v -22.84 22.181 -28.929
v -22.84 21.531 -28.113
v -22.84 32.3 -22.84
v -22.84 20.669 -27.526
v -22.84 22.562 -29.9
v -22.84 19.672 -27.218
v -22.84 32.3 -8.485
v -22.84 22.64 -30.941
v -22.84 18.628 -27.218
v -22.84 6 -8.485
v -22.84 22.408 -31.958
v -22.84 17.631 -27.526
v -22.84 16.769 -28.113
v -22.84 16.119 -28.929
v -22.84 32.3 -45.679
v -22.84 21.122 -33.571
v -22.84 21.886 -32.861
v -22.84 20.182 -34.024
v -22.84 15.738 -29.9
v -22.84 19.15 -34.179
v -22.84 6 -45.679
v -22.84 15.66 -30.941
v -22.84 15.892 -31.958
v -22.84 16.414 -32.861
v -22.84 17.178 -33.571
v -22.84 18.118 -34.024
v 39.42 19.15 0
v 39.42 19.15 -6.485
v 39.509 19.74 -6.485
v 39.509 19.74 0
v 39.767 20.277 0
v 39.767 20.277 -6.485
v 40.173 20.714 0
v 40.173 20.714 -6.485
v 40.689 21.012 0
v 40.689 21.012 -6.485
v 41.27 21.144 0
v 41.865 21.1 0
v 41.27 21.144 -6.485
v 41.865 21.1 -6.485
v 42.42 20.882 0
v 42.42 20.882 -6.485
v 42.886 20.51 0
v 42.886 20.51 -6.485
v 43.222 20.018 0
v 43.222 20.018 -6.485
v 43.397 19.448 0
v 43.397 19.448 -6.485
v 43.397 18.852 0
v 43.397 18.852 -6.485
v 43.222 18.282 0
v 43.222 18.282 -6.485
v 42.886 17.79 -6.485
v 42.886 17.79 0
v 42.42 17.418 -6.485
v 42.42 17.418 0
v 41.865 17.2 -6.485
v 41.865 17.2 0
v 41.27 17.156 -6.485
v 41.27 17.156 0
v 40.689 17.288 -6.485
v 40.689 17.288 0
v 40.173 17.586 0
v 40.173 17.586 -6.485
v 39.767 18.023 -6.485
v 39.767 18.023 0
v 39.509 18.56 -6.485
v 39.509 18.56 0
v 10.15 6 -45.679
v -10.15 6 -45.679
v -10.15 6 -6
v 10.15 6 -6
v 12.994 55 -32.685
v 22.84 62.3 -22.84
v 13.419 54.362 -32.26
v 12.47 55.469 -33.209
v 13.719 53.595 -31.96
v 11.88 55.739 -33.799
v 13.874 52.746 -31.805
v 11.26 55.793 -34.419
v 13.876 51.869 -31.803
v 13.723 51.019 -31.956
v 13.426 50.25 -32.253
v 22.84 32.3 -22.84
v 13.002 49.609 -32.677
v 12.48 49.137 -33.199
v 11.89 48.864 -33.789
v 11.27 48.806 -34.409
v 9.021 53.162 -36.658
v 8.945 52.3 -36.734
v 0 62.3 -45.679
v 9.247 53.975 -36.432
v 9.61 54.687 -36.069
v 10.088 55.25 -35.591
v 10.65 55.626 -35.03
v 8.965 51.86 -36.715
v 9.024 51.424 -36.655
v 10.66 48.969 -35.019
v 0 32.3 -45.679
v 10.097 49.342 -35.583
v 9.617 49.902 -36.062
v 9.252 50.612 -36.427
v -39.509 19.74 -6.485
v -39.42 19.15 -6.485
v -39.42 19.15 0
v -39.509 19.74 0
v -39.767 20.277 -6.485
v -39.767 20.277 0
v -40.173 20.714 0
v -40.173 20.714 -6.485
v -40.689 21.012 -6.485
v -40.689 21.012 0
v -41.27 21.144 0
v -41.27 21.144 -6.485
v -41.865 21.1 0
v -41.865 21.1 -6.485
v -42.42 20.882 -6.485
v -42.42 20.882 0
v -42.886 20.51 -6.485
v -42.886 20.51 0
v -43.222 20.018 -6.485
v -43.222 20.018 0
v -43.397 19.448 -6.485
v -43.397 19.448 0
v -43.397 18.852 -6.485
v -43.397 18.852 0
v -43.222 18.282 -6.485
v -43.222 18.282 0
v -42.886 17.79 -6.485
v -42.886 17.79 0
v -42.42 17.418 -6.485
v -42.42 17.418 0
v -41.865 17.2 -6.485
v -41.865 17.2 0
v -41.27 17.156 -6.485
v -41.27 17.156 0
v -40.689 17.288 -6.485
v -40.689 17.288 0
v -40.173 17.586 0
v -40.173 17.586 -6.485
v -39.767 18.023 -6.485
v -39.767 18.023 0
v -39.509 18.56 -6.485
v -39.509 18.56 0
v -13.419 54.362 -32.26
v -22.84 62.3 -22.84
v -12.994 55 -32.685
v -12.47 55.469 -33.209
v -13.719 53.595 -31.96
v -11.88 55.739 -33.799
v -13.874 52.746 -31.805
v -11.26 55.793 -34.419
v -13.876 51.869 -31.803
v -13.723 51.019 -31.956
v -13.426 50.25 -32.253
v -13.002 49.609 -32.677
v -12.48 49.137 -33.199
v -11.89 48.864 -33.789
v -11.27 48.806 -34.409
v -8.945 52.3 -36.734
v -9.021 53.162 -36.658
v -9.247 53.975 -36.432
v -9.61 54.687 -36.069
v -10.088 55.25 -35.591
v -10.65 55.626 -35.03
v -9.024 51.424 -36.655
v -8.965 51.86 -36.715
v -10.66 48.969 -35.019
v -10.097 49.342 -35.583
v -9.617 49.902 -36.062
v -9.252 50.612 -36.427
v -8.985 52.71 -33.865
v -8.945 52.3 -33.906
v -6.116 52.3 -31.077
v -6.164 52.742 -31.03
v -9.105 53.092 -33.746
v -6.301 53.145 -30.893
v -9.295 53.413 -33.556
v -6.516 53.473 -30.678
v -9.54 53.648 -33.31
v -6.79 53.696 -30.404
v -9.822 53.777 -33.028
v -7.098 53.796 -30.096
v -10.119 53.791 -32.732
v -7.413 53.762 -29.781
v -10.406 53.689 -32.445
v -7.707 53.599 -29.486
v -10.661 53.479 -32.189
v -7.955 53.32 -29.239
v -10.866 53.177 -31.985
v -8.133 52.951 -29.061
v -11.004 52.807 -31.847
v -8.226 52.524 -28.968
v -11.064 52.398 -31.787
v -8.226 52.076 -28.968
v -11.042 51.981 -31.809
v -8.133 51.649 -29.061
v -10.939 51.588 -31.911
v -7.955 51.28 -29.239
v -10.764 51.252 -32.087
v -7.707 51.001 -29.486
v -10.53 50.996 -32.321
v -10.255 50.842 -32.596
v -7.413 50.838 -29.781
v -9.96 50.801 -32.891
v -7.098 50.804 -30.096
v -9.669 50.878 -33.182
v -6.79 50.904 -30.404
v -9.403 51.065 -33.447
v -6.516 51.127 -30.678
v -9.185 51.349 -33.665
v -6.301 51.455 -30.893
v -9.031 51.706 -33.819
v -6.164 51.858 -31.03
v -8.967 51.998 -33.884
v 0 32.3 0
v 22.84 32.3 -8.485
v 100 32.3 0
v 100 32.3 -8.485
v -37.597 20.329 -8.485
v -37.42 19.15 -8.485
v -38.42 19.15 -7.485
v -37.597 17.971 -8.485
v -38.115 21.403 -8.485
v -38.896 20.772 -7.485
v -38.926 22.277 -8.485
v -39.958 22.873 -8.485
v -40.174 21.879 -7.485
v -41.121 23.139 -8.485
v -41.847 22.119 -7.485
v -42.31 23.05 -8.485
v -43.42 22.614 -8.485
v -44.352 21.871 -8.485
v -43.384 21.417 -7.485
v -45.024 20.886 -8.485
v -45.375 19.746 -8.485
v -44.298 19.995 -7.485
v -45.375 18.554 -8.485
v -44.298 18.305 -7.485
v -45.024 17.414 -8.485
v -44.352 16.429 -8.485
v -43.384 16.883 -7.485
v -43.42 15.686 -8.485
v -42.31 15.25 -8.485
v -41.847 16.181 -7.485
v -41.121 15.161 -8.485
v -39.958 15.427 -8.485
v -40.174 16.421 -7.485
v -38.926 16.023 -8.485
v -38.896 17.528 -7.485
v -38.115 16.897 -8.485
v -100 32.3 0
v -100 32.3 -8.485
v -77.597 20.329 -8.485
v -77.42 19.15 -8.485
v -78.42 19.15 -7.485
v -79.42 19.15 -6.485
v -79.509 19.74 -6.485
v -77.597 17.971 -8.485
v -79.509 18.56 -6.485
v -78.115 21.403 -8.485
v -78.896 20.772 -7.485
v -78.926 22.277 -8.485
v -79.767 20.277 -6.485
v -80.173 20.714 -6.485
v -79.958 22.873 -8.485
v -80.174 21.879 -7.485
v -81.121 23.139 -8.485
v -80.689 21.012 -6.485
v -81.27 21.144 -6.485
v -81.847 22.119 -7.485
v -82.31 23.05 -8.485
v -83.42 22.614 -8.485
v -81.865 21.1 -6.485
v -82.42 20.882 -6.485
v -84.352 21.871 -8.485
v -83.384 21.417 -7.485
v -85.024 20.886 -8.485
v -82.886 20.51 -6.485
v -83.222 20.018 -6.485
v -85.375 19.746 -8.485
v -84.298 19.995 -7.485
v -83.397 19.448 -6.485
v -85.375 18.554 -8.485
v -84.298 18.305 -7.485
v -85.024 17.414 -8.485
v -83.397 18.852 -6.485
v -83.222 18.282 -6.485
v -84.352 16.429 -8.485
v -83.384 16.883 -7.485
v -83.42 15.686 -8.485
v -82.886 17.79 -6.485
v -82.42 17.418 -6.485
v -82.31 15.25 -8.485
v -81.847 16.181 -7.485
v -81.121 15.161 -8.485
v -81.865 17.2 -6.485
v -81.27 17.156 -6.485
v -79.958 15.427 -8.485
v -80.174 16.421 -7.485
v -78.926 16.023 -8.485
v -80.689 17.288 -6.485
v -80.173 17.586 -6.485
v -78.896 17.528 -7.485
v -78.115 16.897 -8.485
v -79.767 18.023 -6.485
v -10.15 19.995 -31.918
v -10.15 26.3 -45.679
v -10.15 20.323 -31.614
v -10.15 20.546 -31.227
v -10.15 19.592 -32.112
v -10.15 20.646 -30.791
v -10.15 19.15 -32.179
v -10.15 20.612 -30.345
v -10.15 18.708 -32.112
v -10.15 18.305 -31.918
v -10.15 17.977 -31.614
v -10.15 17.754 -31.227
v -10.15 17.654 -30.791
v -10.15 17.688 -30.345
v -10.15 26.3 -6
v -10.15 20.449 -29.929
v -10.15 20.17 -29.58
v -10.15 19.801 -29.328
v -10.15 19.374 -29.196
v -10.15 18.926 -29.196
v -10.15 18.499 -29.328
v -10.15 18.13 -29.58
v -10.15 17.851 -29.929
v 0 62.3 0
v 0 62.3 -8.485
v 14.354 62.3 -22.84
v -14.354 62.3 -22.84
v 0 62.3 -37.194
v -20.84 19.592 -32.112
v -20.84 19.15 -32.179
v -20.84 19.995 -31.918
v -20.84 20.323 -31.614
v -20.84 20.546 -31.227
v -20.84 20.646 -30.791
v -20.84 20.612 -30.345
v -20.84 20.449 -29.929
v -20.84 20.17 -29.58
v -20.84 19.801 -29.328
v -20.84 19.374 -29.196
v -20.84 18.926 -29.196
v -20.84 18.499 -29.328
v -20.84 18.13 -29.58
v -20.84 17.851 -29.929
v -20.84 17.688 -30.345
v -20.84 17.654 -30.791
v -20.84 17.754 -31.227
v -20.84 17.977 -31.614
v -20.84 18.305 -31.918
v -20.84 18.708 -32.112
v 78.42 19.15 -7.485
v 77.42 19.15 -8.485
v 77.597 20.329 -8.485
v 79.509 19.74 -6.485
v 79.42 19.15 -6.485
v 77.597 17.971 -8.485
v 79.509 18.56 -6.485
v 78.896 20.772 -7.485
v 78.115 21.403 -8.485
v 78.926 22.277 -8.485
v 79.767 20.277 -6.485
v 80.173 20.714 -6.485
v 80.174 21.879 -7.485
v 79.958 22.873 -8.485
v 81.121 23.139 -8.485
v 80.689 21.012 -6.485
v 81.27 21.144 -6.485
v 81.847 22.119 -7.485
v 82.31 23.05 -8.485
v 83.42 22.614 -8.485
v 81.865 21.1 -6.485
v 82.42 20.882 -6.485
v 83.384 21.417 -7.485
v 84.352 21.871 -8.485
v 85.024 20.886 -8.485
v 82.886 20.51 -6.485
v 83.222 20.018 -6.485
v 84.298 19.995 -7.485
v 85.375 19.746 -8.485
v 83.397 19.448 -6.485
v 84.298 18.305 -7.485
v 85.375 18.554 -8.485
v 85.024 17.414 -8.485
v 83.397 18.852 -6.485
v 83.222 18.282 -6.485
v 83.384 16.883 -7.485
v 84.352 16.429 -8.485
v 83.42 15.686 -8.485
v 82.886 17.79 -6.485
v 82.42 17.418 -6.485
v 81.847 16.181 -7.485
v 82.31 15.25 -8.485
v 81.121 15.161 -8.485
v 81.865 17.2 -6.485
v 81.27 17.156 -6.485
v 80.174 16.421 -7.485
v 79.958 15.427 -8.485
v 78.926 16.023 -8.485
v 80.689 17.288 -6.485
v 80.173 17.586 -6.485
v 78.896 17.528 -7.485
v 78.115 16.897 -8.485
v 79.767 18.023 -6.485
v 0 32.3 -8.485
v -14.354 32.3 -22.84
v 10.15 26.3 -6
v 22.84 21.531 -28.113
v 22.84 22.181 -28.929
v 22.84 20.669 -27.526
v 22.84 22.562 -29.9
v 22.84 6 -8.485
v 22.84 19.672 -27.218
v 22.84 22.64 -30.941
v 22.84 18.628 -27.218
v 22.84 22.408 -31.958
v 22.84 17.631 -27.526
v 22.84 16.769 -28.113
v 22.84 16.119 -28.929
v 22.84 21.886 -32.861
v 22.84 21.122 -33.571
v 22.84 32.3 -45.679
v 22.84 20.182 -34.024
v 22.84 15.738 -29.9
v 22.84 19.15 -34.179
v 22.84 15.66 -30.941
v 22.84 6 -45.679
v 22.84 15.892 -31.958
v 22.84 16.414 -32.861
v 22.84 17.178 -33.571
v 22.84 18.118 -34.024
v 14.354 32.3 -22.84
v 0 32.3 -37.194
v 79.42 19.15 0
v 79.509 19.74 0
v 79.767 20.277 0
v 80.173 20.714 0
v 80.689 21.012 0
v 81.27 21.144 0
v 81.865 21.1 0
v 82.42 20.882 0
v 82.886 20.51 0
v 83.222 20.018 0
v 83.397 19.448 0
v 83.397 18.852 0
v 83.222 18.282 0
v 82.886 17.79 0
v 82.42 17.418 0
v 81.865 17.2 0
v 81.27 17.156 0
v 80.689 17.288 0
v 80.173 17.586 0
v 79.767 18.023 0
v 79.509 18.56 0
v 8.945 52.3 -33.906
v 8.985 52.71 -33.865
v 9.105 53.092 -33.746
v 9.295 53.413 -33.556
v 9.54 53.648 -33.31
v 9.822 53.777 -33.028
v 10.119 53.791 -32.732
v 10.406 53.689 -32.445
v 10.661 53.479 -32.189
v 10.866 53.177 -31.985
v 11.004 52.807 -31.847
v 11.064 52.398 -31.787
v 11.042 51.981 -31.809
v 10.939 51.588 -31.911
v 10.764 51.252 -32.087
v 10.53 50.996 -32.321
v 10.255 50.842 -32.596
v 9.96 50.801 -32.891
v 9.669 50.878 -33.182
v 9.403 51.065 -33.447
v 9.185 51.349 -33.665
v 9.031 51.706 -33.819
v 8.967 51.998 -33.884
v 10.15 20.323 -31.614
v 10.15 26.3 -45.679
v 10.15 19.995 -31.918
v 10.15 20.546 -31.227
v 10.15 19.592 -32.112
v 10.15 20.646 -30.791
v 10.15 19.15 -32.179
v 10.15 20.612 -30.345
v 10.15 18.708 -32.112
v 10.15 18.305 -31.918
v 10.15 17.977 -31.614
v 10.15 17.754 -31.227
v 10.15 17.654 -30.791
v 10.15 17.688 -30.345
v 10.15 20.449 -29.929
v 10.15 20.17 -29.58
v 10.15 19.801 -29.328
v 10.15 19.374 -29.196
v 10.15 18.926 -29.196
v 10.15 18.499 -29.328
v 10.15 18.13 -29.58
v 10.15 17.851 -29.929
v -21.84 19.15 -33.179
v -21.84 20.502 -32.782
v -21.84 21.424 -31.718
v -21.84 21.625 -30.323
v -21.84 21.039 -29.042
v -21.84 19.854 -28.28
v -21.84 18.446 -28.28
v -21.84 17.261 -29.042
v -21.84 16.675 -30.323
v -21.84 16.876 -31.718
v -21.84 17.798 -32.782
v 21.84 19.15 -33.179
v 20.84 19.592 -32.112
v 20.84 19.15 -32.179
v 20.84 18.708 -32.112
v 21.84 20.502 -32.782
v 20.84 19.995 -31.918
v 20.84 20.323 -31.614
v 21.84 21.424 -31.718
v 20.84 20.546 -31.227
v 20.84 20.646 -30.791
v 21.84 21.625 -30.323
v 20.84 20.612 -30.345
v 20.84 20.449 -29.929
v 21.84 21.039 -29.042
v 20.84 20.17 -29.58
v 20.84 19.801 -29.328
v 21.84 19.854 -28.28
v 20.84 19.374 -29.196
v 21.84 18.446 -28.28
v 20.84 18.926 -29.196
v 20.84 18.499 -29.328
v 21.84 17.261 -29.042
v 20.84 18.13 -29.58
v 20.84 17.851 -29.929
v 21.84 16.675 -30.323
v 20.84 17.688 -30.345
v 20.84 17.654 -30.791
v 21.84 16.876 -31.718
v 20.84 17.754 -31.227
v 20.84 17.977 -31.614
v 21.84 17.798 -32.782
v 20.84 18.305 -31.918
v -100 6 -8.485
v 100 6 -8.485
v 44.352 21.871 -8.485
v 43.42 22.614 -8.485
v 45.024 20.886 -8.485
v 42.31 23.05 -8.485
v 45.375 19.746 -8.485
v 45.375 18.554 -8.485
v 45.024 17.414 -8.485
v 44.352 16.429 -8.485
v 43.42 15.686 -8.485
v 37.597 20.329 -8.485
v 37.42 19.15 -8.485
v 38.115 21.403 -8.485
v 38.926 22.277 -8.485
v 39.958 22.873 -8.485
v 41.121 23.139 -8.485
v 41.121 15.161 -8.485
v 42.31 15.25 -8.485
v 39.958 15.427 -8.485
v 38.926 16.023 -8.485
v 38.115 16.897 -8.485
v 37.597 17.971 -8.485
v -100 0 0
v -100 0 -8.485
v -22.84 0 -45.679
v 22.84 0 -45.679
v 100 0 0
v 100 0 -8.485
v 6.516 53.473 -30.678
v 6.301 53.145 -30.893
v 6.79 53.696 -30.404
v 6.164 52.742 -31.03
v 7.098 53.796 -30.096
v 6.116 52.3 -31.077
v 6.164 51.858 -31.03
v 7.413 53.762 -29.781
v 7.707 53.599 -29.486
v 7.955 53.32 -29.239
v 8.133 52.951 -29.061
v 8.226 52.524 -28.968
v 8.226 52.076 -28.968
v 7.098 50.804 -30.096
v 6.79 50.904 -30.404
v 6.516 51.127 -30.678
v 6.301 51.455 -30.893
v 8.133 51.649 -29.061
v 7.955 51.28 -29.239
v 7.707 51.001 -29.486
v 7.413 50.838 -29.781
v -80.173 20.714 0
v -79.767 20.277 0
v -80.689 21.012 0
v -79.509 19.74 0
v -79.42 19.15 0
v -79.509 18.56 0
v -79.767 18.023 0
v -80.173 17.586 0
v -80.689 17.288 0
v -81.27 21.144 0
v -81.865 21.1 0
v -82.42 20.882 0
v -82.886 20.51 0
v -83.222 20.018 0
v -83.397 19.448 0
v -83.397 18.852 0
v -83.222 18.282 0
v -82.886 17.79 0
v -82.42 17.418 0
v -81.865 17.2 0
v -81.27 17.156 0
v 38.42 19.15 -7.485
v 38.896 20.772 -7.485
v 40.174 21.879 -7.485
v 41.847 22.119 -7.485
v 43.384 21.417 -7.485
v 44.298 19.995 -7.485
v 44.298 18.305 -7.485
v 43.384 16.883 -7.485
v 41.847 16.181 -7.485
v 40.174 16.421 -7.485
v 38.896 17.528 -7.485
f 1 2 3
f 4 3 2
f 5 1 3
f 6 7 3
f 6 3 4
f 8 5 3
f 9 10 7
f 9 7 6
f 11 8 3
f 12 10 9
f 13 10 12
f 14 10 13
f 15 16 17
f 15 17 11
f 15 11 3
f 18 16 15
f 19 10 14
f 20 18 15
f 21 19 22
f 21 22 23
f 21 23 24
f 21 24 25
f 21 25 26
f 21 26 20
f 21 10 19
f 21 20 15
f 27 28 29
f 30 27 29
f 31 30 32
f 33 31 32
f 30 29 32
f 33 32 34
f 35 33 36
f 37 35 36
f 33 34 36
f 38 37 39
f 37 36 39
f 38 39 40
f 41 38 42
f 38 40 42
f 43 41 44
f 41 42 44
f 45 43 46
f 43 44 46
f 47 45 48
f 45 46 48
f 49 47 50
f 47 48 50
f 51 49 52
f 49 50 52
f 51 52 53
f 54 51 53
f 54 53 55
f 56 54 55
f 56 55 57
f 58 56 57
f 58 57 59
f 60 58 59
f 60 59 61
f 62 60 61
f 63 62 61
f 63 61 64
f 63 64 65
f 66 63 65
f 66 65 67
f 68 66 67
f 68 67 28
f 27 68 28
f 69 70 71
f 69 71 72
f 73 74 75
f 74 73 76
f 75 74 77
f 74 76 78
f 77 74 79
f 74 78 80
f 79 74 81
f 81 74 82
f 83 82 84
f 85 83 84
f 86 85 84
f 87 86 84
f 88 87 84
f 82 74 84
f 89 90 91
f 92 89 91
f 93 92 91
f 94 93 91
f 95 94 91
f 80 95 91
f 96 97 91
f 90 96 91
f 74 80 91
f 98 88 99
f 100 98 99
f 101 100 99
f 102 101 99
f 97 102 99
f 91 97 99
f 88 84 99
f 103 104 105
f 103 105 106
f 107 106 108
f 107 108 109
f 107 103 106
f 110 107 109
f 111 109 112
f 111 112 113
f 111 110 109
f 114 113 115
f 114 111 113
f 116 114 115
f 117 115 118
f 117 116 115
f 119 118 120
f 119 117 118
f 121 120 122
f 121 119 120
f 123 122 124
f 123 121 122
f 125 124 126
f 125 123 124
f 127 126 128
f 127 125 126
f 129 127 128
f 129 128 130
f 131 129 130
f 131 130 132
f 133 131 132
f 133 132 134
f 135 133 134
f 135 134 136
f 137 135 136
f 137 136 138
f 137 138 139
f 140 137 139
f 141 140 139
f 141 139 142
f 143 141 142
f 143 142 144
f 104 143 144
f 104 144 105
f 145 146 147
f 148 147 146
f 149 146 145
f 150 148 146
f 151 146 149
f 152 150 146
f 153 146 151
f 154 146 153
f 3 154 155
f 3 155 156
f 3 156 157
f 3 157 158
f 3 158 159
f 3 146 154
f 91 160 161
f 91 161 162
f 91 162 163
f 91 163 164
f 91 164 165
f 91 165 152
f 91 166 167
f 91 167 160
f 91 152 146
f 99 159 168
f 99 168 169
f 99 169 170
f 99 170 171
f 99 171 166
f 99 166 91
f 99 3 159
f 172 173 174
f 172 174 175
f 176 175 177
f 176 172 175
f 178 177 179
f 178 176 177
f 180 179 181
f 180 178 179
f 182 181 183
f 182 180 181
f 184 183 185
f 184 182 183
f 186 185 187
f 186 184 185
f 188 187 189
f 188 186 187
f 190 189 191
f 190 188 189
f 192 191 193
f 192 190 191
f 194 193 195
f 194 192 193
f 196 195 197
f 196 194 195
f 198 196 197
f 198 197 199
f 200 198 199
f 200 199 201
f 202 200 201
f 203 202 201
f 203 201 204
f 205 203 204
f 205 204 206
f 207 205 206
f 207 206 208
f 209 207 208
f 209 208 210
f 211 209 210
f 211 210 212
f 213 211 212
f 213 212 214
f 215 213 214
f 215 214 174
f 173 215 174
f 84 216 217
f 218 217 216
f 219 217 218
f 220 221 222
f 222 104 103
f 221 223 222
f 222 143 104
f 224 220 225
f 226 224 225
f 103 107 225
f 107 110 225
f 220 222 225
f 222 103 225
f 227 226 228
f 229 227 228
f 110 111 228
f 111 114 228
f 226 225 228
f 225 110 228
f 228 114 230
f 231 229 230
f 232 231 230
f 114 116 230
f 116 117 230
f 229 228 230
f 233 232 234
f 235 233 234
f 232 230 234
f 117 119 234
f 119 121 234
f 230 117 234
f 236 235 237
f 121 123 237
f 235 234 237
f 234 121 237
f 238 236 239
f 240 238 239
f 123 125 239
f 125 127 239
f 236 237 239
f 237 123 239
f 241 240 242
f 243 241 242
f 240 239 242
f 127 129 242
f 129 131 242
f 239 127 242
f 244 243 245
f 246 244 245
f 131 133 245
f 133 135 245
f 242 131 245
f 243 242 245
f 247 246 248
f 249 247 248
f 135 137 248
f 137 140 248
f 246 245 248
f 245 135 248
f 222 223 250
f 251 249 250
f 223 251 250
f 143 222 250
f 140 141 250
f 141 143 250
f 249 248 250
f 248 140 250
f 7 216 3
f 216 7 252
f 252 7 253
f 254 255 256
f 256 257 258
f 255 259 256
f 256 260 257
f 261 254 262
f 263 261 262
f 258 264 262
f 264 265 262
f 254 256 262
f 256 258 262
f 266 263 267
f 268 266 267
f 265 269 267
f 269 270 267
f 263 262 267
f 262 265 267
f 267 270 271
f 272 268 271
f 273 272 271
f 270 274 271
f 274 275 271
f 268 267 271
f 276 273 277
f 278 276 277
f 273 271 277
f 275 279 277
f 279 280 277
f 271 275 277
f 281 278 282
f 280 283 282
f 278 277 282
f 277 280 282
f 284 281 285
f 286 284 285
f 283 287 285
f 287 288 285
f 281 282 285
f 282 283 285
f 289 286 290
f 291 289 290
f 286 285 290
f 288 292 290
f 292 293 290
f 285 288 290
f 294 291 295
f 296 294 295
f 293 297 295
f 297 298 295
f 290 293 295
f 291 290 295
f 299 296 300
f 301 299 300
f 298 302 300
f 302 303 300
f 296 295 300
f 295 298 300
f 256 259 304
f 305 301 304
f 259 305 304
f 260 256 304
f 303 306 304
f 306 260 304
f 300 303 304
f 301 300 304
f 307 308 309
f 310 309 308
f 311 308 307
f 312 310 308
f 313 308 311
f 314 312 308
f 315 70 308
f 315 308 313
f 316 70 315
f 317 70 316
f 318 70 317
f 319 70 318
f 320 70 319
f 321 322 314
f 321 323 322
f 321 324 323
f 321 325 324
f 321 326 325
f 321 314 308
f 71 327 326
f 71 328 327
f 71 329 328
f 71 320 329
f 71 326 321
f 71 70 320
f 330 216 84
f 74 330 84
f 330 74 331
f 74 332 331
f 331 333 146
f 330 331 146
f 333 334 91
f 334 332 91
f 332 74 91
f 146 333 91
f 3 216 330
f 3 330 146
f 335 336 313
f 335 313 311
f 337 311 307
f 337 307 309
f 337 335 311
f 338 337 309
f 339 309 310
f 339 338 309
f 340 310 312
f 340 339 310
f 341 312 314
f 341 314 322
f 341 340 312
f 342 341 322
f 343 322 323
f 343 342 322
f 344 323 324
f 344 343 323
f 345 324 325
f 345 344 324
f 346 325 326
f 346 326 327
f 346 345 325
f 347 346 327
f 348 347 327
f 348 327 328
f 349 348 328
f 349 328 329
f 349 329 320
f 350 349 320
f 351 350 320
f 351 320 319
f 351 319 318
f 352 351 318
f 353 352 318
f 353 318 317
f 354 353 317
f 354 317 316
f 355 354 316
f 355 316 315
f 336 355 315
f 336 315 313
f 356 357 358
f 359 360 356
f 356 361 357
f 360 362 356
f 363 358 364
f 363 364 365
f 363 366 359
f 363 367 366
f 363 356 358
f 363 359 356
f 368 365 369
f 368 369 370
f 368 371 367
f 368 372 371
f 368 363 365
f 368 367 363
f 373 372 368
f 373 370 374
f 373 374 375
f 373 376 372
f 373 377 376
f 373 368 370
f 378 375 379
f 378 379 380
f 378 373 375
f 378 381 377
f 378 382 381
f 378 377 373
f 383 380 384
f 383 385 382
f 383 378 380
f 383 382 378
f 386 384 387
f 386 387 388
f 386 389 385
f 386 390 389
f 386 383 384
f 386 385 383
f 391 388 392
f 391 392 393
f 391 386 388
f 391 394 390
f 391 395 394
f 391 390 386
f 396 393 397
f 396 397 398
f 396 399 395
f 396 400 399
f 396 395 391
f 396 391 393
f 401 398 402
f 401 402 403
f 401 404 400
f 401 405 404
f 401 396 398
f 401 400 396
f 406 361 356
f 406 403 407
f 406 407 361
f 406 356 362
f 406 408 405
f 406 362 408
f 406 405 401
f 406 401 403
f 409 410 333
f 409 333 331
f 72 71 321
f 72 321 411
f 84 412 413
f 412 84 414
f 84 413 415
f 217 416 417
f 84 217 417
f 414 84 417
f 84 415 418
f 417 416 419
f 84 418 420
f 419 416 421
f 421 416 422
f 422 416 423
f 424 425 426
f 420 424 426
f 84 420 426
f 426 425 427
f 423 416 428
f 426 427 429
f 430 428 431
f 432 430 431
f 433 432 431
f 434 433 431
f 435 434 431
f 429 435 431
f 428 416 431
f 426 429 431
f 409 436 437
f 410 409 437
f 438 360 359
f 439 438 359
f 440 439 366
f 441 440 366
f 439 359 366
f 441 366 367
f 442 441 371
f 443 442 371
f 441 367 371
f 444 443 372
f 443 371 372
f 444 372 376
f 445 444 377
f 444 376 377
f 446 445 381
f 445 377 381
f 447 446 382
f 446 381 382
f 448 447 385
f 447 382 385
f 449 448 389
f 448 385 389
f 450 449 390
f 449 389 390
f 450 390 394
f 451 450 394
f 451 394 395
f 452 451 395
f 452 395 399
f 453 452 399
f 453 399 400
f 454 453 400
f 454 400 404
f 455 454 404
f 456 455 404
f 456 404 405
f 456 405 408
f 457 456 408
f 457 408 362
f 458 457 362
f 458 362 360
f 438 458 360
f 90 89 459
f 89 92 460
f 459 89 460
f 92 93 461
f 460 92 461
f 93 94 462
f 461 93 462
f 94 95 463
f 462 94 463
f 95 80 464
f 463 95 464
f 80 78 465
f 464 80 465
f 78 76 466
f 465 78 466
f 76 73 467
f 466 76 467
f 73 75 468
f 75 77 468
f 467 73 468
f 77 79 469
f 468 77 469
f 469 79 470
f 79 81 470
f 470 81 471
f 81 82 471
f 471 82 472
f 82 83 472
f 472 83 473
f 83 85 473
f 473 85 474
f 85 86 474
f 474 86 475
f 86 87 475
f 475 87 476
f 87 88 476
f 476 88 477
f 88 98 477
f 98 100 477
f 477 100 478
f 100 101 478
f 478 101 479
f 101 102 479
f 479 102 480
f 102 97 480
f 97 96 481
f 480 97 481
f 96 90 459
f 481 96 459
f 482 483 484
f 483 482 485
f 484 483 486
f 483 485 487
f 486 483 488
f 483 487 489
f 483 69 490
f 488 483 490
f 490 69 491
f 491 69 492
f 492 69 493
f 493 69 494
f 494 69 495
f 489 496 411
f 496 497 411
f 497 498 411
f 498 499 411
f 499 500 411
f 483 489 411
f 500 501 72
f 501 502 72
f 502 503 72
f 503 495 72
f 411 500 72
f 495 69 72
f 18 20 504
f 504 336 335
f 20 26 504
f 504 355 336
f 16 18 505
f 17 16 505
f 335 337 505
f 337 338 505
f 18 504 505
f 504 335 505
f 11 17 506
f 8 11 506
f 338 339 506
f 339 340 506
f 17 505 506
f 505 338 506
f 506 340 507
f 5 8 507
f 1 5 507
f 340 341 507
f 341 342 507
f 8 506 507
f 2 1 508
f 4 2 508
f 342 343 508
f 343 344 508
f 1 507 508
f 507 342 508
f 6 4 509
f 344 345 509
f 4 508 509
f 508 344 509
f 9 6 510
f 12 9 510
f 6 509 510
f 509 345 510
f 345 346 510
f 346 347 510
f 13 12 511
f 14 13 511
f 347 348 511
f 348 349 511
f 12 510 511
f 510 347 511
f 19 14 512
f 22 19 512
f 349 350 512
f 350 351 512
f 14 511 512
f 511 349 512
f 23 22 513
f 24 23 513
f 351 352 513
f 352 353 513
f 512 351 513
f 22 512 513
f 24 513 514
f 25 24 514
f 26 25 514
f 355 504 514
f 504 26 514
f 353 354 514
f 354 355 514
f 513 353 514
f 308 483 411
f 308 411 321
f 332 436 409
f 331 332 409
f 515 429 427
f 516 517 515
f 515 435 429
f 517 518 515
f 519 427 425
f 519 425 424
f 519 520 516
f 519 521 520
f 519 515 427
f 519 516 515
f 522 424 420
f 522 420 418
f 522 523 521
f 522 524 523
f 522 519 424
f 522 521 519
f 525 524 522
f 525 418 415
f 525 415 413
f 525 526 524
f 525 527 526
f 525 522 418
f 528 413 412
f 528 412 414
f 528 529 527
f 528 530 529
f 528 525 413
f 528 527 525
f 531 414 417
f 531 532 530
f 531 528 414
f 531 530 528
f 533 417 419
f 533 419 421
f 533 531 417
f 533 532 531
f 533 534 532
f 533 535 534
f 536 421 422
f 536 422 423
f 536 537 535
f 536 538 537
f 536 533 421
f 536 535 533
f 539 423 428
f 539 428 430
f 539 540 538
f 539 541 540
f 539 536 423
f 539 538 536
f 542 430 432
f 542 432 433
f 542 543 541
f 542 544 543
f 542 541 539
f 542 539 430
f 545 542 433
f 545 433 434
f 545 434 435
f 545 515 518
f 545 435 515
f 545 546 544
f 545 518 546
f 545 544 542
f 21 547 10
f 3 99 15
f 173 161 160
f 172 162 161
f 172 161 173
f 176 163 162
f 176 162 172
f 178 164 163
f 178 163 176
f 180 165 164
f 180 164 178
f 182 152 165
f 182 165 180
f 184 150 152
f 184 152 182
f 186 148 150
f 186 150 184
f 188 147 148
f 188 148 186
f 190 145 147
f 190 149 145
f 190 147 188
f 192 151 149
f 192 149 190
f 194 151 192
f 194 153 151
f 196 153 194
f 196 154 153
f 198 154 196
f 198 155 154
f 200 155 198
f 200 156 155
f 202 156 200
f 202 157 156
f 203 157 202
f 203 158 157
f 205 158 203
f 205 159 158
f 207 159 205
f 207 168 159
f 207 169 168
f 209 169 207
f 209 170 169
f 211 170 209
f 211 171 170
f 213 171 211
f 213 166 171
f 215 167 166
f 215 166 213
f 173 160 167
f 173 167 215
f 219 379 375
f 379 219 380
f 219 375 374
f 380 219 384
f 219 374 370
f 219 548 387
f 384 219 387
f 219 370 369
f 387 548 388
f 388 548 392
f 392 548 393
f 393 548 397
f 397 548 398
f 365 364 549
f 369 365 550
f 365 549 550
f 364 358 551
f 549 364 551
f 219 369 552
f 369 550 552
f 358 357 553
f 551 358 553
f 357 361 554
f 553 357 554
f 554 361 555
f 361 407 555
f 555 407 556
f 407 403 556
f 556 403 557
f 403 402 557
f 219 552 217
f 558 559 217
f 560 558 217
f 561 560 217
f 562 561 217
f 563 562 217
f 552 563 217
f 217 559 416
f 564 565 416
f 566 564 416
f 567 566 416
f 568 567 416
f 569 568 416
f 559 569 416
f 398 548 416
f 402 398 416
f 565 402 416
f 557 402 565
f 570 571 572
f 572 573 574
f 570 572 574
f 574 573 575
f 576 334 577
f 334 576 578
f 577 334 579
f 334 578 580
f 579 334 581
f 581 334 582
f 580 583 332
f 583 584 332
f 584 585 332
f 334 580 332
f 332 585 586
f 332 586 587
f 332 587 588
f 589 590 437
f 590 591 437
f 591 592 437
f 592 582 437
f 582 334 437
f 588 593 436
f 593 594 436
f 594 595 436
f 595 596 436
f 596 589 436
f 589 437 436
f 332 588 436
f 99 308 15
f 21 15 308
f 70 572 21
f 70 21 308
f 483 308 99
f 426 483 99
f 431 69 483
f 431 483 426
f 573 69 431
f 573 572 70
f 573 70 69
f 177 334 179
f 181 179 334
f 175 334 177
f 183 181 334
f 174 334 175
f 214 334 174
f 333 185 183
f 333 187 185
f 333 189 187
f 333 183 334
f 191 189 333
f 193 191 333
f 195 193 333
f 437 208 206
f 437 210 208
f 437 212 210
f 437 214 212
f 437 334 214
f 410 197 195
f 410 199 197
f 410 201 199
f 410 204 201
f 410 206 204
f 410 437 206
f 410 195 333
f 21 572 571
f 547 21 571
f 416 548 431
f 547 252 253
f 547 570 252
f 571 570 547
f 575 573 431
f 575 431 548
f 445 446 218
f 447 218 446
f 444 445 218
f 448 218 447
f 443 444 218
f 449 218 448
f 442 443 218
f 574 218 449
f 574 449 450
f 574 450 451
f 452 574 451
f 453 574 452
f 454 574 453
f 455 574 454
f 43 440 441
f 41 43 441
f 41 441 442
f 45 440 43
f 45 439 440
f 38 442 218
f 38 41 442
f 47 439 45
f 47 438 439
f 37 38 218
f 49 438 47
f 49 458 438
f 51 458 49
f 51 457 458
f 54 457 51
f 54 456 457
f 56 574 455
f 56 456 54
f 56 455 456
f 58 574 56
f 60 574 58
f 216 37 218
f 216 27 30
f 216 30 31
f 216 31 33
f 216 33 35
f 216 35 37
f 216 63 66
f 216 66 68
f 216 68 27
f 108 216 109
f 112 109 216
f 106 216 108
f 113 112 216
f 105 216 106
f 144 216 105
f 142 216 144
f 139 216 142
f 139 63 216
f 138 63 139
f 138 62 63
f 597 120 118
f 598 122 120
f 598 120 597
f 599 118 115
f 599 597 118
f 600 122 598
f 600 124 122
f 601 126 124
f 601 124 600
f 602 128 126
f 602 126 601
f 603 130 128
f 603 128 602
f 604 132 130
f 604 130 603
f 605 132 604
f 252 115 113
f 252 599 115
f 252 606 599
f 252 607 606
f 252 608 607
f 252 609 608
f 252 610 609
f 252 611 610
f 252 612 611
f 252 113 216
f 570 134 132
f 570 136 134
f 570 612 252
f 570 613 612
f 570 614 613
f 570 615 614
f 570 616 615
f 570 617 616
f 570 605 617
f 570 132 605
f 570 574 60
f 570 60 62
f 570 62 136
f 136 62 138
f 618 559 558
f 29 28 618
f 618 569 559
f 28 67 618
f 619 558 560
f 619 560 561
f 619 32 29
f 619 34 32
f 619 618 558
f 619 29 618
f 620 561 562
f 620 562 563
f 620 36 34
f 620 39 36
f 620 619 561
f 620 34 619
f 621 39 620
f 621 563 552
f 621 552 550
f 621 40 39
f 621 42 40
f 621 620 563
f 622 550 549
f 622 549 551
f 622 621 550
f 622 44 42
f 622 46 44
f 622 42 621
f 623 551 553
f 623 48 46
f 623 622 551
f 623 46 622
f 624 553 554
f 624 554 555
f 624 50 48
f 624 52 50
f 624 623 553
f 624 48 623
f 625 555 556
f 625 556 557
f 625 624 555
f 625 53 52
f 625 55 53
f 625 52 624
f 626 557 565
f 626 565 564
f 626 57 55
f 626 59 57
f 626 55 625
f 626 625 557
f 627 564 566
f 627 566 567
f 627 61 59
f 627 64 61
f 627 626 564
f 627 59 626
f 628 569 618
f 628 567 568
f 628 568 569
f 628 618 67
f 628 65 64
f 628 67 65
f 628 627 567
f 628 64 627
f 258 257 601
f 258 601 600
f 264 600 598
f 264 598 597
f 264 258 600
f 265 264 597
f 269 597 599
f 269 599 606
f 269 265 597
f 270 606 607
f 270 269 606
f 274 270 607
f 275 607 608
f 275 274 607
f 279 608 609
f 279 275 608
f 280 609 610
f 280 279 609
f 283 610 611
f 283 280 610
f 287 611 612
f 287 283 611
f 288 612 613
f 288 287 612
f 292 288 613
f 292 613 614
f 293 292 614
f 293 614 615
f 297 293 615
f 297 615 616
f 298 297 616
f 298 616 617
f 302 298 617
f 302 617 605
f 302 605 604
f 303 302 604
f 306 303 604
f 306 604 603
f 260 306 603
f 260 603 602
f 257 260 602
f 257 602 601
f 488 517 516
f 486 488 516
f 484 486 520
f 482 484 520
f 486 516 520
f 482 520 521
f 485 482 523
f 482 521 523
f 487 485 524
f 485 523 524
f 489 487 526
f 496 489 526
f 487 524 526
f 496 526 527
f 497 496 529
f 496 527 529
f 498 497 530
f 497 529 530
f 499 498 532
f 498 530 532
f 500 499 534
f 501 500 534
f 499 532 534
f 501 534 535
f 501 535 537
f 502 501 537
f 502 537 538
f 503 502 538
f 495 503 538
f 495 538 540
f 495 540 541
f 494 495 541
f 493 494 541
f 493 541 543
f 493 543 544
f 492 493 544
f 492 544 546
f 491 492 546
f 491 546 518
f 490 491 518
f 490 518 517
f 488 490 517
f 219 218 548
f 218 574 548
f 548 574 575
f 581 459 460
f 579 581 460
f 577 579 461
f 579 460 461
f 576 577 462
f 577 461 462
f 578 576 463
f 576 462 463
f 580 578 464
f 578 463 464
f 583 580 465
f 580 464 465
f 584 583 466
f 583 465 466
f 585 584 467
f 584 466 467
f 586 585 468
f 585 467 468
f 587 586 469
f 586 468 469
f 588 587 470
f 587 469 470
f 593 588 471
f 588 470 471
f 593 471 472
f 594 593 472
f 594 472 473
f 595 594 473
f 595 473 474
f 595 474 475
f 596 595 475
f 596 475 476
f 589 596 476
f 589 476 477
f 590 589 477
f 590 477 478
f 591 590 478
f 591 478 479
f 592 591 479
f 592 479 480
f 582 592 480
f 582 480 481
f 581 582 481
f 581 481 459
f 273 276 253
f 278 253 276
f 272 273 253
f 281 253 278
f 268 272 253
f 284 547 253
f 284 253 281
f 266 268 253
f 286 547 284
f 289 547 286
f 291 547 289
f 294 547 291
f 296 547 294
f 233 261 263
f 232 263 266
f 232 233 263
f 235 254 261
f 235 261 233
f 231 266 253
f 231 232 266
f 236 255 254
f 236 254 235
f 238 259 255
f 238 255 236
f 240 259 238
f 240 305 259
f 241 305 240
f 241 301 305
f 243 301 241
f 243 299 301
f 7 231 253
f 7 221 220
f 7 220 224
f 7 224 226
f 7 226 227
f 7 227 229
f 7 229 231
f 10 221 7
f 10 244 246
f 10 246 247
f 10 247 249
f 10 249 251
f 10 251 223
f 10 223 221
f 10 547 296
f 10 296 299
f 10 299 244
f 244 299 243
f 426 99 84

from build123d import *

# Parameters (mm, degrees)
BOSS_EXTRU_1_DEPTH      = 6
BOSS_EXTRU_2_DEPTH      = 20.3
BOSS_EXTRU_3_DEPTH      = 6
BOSS_EXTRU_4_DEPTH      = 30
ESQUISSE5_R             = 1.5
ENL_V_MAT_EXTRU_1_DEPTH = 30
ESQUISSE6_R             = 1.5
ENL_V_MAT_EXTRU_2_DEPTH = 30
ESQUISSE7_R             = 2
ENL_V_MAT_EXTRU_3_DEPTH = 30
CHANFREIN1_SIZE         = 2


with BuildPart() as part:
    # Esquisse1 → Boss.-Extru.1 (new body)
    with BuildSketch(Plane(origin=(0, 0, 0), x_dir=(1, 0, 0), z_dir=(0, 1, 0))):
        Polygon((22.839549032, 45.679098065), (100, 8.485281374), (22.839549032, 8.485281374), align=None)
        Polygon((22.839549032, 45.679098065), (0, 45.679098065), (0, 0), (100, 0), (100, 8.485281374), (22.839549032, 8.485281374), align=None)
    extrude(amount=BOSS_EXTRU_1_DEPTH)

    # Esquisse2 → Boss.-Extru.2 (add)
    with BuildSketch(Plane(origin=(0, 6, 0), x_dir=(1, 0, 0), z_dir=(0, 1, 0))):
        Polygon((22.839549032, 45.679098065), (10.15, 45.679098065), (10.15, 6), (0, 6), (0, 0), (100, 0), (100, 8.485281374), (22.839549032, 8.485281374), align=None)
    extrude(amount=BOSS_EXTRU_2_DEPTH)

    # Esquisse3 → Boss.-Extru.3 (add)
    with BuildSketch(Plane(origin=(0, 26.3, 0), x_dir=(1, 0, 0), z_dir=(0, 1, 0))):
        Polygon((22.839549032, 45.679098065), (0, 45.679098065), (0, 0), (100, 0), (100, 8.485281374), (22.839549032, 8.485281374), align=None)
    extrude(amount=BOSS_EXTRU_3_DEPTH)

    # Esquisse4 → Boss.-Extru.4 (add)
    with BuildSketch(Plane(origin=(0, 32.3, 0), x_dir=(1, 0, 0), z_dir=(0, 1, 0))):
        Polygon((0, 0), (22.839549032, 22.839548119), (0, 45.679098065), (0, 37.193816521), (14.354267489, 22.839548459), (0, 8.485281544), align=None)
    extrude(amount=BOSS_EXTRU_4_DEPTH)

    # Esquisse5 → Enlèv. mat.-Extru.1 (cut)
    with BuildSketch(Plane(origin=(22.839549032, 0, -22.839548119), x_dir=(-0.7071067670543795, 0, -0.7071067953187153), z_dir=(0.7071067953187153, 0, -0.7071067670543795))):
        with Locations((16.150000323, 52.3)):
            Circle(ESQUISSE5_R)
    extrude(amount=-ENL_V_MAT_EXTRU_1_DEPTH, mode=Mode.SUBTRACT)

    # Esquisse6 → Enlèv. mat.-Extru.2 (cut)
    with BuildSketch(Plane(origin=(22.839549032, 0, 0), x_dir=(0, 0, -1), z_dir=(1, 0, 0))):
        with Locations((30.679098065, 19.15)):
            Circle(ESQUISSE6_R)
    extrude(amount=-ENL_V_MAT_EXTRU_2_DEPTH, mode=Mode.SUBTRACT)

    # Esquisse7 → Enlèv. mat.-Extru.3 (cut)
    with BuildSketch(Plane(origin=(0, 0, -8.485281374), x_dir=(-1, 0, 0), z_dir=(0, 0, -1))):
        with Locations((-41.419774516, 19.15)):
            Circle(ESQUISSE7_R)
        with Locations((-81.419774516, 19.15)):
            Circle(ESQUISSE7_R)
    extrude(amount=-ENL_V_MAT_EXTRU_3_DEPTH, mode=Mode.SUBTRACT)

    # Chanfrein1
    chanfrein1_edges = [part.edges().sort_by_distance(p)[0] for p in [
        (12.480434667, 52.3, -33.198662899),
        (22.839549032, 19.15, -29.179098065),
        (43.419774516, 19.15, -8.485281374),
        (83.419774516, 19.15, -8.485281374),
    ]]
    chamfer(chanfrein1_edges, length=CHANFREIN1_SIZE)

    # Symétrie1: part across plane


with BuildPart() as part_1:
    add(part.part)
    add(part.part.mirror(Plane(origin=(0, 6, 0), x_dir=(0, 0, 1), z_dir=(1, 0, 0))))


solid = part_1.part
